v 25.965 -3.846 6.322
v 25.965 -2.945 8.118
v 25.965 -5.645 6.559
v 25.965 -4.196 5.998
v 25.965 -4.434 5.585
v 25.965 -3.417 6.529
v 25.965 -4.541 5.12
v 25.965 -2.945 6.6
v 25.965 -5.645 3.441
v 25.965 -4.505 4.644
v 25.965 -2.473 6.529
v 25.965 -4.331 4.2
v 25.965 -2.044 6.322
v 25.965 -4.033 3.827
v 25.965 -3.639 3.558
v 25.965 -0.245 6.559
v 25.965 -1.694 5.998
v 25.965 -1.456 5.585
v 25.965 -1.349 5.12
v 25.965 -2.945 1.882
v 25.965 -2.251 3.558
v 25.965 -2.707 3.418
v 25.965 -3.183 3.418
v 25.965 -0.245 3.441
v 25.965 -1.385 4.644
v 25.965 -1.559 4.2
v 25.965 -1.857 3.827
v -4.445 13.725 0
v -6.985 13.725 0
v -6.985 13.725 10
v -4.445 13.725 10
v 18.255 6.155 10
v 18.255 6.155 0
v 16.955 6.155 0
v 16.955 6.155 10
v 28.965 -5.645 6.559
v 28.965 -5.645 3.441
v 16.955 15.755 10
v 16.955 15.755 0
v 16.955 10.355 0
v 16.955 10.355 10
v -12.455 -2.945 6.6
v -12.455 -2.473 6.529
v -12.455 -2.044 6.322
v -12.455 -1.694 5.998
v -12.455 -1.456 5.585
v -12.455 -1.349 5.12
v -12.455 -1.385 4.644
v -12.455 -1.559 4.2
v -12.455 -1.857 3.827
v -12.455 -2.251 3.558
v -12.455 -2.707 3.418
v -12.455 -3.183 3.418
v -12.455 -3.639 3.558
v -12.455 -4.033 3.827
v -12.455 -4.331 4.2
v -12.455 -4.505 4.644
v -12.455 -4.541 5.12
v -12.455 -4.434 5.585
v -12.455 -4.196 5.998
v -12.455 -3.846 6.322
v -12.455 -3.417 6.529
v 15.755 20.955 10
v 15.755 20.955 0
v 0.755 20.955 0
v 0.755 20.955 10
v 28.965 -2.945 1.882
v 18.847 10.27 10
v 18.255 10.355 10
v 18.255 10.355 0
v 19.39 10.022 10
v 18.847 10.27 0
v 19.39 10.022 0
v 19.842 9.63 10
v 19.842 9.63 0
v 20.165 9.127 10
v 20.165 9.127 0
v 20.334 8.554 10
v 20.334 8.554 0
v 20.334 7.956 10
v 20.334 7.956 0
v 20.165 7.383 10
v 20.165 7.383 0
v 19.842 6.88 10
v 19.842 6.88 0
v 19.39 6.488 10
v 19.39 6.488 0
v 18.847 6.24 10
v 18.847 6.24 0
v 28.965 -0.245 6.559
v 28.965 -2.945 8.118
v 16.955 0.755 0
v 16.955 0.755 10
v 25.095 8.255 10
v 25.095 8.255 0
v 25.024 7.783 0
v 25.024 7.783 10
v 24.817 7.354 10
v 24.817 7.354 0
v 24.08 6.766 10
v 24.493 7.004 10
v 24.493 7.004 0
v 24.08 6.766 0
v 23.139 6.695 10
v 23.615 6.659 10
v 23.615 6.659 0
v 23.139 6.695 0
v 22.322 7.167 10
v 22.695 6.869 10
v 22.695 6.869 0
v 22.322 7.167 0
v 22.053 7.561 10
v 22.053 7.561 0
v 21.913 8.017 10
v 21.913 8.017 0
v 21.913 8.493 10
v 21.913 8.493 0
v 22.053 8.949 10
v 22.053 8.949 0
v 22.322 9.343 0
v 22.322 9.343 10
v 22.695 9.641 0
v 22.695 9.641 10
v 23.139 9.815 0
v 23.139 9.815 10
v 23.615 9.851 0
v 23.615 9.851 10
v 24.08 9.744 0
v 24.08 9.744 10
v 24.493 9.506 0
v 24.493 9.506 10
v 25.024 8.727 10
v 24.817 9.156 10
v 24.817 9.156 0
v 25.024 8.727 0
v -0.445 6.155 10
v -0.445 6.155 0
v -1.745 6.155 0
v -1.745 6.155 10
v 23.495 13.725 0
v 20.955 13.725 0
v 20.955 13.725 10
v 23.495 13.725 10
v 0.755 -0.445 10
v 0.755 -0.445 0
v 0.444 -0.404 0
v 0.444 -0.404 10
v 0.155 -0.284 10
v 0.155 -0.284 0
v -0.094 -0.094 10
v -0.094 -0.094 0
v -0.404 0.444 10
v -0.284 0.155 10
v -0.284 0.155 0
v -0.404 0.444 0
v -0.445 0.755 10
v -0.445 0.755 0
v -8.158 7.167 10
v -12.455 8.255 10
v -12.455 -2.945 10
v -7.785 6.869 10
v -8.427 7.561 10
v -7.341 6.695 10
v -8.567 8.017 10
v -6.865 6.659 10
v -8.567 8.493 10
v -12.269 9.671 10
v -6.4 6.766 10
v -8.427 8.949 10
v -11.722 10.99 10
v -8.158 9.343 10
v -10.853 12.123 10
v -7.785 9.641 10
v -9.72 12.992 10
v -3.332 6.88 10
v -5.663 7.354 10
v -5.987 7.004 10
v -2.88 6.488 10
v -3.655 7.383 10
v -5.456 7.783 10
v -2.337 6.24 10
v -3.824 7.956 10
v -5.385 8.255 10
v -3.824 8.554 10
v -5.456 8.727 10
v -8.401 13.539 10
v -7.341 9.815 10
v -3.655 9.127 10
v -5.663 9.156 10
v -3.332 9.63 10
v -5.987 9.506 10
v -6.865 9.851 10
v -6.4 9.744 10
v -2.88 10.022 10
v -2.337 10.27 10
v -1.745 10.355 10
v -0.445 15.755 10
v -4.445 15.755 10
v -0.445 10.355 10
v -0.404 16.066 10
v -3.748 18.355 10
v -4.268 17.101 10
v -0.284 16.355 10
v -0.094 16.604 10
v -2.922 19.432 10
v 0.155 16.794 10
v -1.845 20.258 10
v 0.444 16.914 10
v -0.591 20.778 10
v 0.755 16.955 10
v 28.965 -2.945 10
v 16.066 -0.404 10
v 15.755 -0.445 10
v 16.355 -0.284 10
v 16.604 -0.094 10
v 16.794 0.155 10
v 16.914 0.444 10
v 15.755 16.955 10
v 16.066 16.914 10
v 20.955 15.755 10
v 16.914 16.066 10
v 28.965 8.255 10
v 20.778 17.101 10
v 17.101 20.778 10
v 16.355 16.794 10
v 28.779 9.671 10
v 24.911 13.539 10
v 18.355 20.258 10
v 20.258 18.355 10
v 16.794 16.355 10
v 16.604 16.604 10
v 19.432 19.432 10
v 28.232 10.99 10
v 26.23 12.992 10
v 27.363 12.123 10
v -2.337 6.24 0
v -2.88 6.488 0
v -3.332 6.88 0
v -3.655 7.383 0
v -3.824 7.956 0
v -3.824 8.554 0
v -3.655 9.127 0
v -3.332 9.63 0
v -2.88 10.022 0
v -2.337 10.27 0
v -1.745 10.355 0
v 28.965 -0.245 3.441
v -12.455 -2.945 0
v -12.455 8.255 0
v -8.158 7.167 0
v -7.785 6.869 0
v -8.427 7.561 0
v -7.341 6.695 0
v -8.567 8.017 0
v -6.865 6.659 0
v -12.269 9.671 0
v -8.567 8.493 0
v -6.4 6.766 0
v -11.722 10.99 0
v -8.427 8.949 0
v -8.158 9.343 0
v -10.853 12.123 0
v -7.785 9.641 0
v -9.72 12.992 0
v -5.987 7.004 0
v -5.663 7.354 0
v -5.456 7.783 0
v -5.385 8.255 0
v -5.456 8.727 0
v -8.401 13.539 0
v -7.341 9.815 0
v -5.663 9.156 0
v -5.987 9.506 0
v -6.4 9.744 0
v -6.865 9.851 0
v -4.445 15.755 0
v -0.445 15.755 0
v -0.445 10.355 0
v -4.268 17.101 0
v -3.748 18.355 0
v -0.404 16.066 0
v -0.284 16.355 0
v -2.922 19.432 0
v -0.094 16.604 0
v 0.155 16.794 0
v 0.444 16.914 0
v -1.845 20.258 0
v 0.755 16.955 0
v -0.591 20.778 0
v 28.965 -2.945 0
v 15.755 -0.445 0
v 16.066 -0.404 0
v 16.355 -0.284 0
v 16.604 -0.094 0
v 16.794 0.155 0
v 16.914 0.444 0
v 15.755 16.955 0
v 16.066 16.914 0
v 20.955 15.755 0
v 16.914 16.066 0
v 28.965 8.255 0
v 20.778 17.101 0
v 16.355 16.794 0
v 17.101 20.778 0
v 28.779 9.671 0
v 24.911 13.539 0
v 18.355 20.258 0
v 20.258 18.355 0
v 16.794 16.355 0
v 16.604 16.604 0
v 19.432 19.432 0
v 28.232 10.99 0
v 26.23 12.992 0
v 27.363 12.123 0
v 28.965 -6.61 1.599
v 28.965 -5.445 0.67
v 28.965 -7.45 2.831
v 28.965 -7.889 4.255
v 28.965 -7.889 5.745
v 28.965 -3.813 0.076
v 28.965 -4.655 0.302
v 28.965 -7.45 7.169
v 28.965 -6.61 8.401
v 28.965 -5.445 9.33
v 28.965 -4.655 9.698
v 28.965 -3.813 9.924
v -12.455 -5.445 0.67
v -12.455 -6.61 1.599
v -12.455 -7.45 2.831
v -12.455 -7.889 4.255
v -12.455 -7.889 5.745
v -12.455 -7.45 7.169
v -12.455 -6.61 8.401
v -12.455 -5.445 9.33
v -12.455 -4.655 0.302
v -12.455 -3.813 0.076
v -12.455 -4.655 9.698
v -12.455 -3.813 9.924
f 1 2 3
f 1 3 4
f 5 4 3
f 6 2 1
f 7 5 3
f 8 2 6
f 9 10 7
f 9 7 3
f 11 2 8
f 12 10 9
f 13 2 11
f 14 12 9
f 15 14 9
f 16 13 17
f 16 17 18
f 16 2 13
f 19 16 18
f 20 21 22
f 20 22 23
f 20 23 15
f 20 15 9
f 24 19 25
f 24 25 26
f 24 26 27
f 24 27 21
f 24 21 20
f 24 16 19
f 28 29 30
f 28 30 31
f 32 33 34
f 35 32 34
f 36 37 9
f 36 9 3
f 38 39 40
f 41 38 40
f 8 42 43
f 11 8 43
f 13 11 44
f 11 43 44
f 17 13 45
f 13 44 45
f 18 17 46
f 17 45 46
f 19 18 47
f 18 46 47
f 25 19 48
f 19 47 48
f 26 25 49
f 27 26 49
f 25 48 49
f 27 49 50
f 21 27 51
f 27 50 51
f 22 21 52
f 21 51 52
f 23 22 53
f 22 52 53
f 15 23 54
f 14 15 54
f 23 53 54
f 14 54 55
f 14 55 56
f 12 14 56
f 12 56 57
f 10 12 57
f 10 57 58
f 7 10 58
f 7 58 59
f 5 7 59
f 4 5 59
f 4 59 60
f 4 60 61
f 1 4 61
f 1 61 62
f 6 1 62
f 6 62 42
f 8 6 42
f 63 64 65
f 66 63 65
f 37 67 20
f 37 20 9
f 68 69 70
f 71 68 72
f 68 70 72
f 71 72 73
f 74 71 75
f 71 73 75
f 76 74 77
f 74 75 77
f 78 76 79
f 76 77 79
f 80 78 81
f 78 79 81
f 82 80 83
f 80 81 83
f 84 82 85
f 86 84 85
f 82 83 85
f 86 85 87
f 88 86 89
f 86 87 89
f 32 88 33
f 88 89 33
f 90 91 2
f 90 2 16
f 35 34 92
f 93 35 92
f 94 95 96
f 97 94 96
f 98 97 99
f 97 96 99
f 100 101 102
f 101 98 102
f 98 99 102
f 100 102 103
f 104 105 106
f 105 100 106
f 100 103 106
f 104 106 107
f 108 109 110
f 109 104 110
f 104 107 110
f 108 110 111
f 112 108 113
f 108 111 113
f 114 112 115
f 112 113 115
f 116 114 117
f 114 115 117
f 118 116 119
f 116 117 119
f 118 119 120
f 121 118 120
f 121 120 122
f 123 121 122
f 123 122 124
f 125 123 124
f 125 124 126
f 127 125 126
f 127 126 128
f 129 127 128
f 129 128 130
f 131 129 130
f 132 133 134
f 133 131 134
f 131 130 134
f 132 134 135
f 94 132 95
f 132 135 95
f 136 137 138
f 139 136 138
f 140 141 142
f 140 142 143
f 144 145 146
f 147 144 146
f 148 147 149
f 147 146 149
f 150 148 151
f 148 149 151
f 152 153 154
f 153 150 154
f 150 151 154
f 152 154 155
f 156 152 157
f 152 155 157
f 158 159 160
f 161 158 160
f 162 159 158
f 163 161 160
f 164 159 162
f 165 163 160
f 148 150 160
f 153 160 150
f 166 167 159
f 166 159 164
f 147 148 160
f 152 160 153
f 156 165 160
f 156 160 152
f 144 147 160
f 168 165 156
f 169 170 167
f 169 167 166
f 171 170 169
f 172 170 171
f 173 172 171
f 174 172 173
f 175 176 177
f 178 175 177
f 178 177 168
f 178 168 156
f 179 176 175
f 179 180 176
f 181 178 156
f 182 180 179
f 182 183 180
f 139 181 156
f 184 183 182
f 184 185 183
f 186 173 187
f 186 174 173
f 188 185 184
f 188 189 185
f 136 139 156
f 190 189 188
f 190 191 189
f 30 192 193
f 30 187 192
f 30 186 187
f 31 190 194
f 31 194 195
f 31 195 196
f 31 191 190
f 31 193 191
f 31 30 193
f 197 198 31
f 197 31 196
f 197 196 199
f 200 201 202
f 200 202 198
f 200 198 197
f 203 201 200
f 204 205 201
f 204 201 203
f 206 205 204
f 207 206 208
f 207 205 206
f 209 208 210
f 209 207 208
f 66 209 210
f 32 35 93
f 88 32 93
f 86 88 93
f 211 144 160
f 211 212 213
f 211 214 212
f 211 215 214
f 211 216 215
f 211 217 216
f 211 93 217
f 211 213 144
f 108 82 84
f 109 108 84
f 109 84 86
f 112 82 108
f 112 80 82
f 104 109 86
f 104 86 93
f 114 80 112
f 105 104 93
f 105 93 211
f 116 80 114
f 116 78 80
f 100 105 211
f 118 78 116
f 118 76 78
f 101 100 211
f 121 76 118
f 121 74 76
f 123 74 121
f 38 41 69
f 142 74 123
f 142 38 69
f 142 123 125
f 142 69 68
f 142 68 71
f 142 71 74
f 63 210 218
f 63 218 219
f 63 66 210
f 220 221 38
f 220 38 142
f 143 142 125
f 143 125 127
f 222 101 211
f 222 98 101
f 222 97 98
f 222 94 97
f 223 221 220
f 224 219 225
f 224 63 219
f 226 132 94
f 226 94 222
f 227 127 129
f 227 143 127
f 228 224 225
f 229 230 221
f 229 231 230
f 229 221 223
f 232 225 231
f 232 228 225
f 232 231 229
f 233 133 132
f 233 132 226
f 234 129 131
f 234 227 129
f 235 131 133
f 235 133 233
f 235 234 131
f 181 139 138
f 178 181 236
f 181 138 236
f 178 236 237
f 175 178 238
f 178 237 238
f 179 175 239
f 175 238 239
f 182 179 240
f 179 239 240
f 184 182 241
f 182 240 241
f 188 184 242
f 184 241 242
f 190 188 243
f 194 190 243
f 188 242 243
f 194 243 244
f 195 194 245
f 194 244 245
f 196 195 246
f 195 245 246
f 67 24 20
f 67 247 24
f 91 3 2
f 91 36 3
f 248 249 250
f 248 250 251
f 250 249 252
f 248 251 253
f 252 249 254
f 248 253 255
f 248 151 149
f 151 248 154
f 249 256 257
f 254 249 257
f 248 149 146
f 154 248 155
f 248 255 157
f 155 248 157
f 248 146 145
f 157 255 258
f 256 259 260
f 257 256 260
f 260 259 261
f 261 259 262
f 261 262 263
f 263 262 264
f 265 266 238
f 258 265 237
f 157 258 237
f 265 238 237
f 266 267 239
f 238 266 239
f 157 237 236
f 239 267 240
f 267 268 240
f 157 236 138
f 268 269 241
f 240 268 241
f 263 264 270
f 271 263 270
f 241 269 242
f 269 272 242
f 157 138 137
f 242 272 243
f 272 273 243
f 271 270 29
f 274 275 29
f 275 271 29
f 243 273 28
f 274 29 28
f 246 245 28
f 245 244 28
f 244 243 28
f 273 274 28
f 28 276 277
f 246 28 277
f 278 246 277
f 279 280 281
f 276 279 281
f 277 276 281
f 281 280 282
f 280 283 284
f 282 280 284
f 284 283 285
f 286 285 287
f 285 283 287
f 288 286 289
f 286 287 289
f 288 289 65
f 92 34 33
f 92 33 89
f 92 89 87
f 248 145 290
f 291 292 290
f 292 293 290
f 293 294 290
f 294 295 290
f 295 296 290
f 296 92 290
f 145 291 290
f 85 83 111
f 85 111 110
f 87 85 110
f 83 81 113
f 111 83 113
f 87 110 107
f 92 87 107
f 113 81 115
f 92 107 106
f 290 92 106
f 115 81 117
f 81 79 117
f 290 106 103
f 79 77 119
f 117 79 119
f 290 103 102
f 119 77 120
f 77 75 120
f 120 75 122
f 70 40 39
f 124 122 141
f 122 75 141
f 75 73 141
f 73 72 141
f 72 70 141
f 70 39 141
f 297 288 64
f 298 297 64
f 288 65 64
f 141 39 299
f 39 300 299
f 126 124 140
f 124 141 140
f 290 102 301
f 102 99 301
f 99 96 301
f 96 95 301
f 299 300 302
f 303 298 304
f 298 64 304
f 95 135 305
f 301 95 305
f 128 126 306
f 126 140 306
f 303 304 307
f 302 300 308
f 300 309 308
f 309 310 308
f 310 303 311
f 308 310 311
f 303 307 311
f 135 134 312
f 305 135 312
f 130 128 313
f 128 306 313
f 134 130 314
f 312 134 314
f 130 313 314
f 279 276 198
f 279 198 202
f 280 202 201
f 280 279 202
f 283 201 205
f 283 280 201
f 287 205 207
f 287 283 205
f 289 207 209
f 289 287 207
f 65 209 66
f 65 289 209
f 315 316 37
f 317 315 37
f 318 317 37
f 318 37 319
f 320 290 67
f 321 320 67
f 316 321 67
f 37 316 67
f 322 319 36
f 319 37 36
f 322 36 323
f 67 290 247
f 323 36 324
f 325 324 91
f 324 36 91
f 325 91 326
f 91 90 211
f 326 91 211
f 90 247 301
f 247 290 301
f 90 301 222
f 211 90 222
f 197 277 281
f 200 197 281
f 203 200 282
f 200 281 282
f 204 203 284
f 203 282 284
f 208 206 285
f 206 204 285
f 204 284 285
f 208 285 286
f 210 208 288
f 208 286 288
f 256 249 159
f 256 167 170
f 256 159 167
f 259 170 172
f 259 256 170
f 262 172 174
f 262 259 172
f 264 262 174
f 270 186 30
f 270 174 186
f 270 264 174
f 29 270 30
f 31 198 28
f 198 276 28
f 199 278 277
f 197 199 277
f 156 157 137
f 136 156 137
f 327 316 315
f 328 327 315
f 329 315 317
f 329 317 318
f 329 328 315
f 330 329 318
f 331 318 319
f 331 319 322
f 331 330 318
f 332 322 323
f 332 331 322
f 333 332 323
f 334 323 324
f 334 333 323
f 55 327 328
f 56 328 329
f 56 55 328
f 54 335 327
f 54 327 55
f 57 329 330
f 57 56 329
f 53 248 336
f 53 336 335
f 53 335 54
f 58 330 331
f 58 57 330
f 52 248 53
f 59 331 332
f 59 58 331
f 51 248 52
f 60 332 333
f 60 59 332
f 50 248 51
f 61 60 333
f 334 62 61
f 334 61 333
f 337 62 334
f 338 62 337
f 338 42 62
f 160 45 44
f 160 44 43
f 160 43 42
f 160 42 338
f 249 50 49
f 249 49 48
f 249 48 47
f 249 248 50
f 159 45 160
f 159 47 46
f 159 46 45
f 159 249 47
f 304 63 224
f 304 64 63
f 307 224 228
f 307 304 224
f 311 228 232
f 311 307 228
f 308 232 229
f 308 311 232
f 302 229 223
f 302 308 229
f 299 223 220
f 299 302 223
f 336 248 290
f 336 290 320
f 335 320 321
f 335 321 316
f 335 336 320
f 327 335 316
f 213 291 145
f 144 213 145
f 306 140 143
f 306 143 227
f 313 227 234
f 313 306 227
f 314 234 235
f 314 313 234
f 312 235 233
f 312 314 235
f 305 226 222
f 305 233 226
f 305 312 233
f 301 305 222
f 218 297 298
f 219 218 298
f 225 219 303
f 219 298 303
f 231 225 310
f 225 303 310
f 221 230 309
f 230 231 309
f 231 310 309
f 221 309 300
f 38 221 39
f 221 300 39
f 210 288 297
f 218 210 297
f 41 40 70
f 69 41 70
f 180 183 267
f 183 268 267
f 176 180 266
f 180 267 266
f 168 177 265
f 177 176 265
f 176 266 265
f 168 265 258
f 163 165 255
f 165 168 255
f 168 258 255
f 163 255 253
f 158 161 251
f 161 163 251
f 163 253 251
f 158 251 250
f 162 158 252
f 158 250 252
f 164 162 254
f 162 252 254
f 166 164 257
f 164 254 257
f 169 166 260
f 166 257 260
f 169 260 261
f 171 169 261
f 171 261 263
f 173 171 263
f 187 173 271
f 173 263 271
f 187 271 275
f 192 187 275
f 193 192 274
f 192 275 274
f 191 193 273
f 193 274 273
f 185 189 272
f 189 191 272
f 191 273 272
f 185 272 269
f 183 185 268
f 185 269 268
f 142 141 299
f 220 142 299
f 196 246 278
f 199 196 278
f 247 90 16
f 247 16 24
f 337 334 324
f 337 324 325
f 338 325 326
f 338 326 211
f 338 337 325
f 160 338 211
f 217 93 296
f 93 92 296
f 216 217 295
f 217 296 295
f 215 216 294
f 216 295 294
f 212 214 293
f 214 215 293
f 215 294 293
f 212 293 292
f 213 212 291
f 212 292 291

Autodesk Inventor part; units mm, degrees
ref_plane "YZ Plane" through (0, 0, 0) normal (1, 0, 0) x (0, 1, 0)
ref_plane "XZ Plane" through (0, 0, 0) normal (0, 1, 0) x (-1, 0, 0)
ref_plane "XY Plane" through (0, 0, 0) normal (0, 0, 1) x (1, 0, 0)
sketch "Эскиз1" plane through (0, 0, 0) normal (0, 0, 1) x (1, 0, 0)
  line L0 (16.51, 16.51) -> (0, 16.51) projected
  line L1 (0, 16.51) -> (0, 11.176) projected
  line L2 (0, 11.176) -> (-6.731, 11.176) projected
  line L3 (-6.731, 11.176) -> (-7.4684, 11.0622) projected
  line L4 (-7.4684, 11.0622) -> (-8.1512, 10.7614) projected
  line L5 (-8.1512, 10.7614) -> (-8.733, 10.2942) projected
  line L6 (-8.733, 10.2942) -> (-9.1739, 9.6923) projected
  line L7 (-9.1739, 9.6923) -> (-9.4441, 8.9967) projected
  line L8 (-9.4441, 8.9967) -> (-9.525, 8.255) projected
  line L9 (-9.525, 8.255) -> (-9.4441, 7.5133) projected
  line L10 (-9.4441, 7.5133) -> (-9.1739, 6.8177) projected
  line L11 (-9.1739, 6.8177) -> (-8.733, 6.2158) projected
  line L12 (-8.733, 6.2158) -> (-8.1512, 5.7486) projected
  line L13 (-8.1512, 5.7486) -> (-7.4684, 5.4478) projected
  line L14 (-7.4684, 5.4478) -> (-6.731, 5.334) projected
  line L15 (-6.731, 5.334) -> (0, 5.334) projected
  line L16 (0, 5.334) -> (0, 0) projected
  line L17 (0, 0) -> (16.51, 0) projected
  line L18 (16.51, 0) -> (16.51, 5.334) projected
  line L19 (16.51, 5.334) -> (23.241, 5.334) projected
  line L20 (23.241, 5.334) -> (23.9784, 5.4478) projected
  line L21 (23.9784, 5.4478) -> (24.6612, 5.7486) projected
  line L22 (24.6612, 5.7486) -> (25.243, 6.2158) projected
  line L23 (25.243, 6.2158) -> (25.6839, 6.8177) projected
  line L24 (25.6839, 6.8177) -> (25.9541, 7.5133) projected
  line L25 (25.9541, 7.5133) -> (26.035, 8.255) projected
  line L26 (26.035, 8.255) -> (25.9541, 8.9967) projected
  line L27 (25.9541, 8.9967) -> (25.6839, 9.6923) projected
  line L28 (25.6839, 9.6923) -> (25.243, 10.2942) projected
  line L29 (25.243, 10.2942) -> (24.6612, 10.7614) projected
  line L30 (24.6612, 10.7614) -> (23.9784, 11.0622) projected
  line L31 (23.9784, 11.0622) -> (23.241, 11.176) projected
  line L32 (23.241, 11.176) -> (16.51, 11.176) projected
  line L33 (16.51, 11.176) -> (16.51, 16.51) projected
  circle A0 centre (18.26, 8.26) radius 1.27 projected
  circle A1 centre (-1.75, 8.26) radius 1.27 projected
  circle A2 centre (11.505, 9.45) radius 0.127 projected
  circle A3 centre (8.386, 9.267) radius 0.127 projected
  circle A4 centre (4.826, 15.748) radius 0.127 projected
  circle A5 centre (4.191, 15.748) radius 0.127 projected
  circle A6 centre (-6.985, 8.255) radius 1.5 projected
  circle A7 centre (23.495, 8.255) radius 1.5 projected
  circle A8 centre (3.048, 4.445) radius 0.1651 projected
  circle A9 centre (6.985, 4.445) radius 0.1651 projected
  circle A10 centre (2.286, 6.731) radius 0.2032 projected
  circle A11 centre (13.716, 8.509) radius 0.2032 projected
  circle A12 centre (12.319, 1.778) radius 0.2032 projected
  circle A13 centre (15.367, 16.002) radius 0.2032 projected
  circle A14 centre (14.732, 1.778) radius 0.2032 projected
  circle A15 centre (13.462, 1.778) radius 0.2032 projected
  circle A16 centre (11.5062, 15.748) radius 0.127 projected
  circle A17 centre (7.874, 15.748) radius 0.127 projected
  circle A18 centre (3.429, 14.859) radius 0.127 projected
  circle A19 centre (14.478, 15.113) radius 0.1651 projected
  circle A20 centre (2.286, 10.541) radius 0.2032 projected
  circle A21 centre (13.716, 11.176) radius 0.2032 projected
  circle A22 centre (5.505, 15.748) radius 0.127 projected
  circle A23 centre (14.478, 14.224) radius 0.1651 projected
  circle A24 centre (13.462, 15.113) radius 0.1651 projected
  circle A25 centre (10.414, 15.7988) radius 0.127 projected
  circle A26 centre (5.005, 9.727) radius 0.127 projected
  circle A27 centre (6.8072, 8.636) radius 0.127 projected
  circle A28 centre (4.699, 8.382) radius 0.127 projected
  circle A29 centre (10.922, 8.636) radius 0.127 projected
  circle A30 centre (6.378, 16.129) radius 0.127 projected
  circle A31 centre (10.4648, 5.4864) radius 0.127 projected
  circle A32 centre (11.2268, 5.4864) radius 0.127 projected
  circle A33 centre (10.4648, 6.1214) radius 0.127 projected
  circle A34 centre (9.1948, 7.8994) radius 0.127 projected
  circle A35 centre (2.955, 14.2) radius 0.3 projected
  circle A36 centre (9.779, 15.748) radius 0.127 projected
  circle A37 centre (9.906, 8.636) radius 0.127 projected
  circle A38 centre (9.194, 7.112) radius 0.127 projected
  circle A39 centre (9.144, 15.748) radius 0.127 projected
  circle A40 centre (5.588, 7.874) radius 0.127 projected
  circle A41 centre (13.335, 6.096) radius 0.1651 projected
  circle A42 centre (6.8072, 7.874) radius 0.127 projected
  circle A43 centre (6.878, 15.748) radius 0.127 projected
  circle A44 centre (7.378, 16.141) radius 0.127 projected
  circle A45 centre (5.588, 7.239) radius 0.127 projected
  circle A46 centre (8.509, 15.748) radius 0.127 projected
  circle A47 centre (7.5946, 7.1186) radius 0.127 projected
  circle A48 centre (13.555, 14.2) radius 0.3 projected
  line L34 (9.655, 16.755) -> (9.655, 15.8775) projected
  arc A49 (6.855, 15.8775) -> (9.655, 15.8775) centre (8.255, 8.255) ccw projected
  line L35 (6.855, 15.8775) -> (6.855, 16.755) projected
  line L36 (6.855, 16.755) -> (0.755, 16.755) projected
  arc A50 (0.755, 16.755) -> (-0.245, 15.755) centre (0.755, 15.755) ccw projected
  line L37 (-0.245, 15.755) -> (-0.245, 10.155) projected
  line L38 (-0.245, 10.155) -> (-1.745, 10.155) projected
  arc A51 (-1.745, 10.155) -> (-1.745, 6.355) centre (-1.745, 8.255) ccw projected
  line L39 (-1.745, 6.355) -> (-0.245, 6.355) projected
  line L40 (-0.245, 6.355) -> (-0.245, 0.755) projected
  arc A52 (-0.245, 0.755) -> (0.755, -0.245) centre (0.755, 0.755) ccw projected
  line L41 (0.755, -0.245) -> (15.755, -0.245) projected
  arc A53 (15.755, -0.245) -> (16.755, 0.755) centre (15.755, 0.755) ccw projected
  line L42 (16.755, 0.755) -> (16.755, 6.355) projected
  line L43 (16.755, 6.355) -> (18.255, 6.355) projected
  arc A54 (18.255, 6.355) -> (18.255, 10.155) centre (18.255, 8.255) ccw projected
  line L44 (18.255, 10.155) -> (16.755, 10.155) projected
  line L45 (16.755, 10.155) -> (16.755, 15.755) projected
  arc A55 (16.755, 15.755) -> (15.755, 16.755) centre (15.755, 15.755) ccw projected
  line L46 (15.755, 16.755) -> (9.655, 16.755) projected
  circle A56 centre (-1.745, 8.255) radius 0.9 projected
  circle A57 centre (18.255, 8.255) radius 0.9 projected
  line L47 (-1.745, 10.355) -> (-0.445, 10.355)
  line L48 (-0.445, 10.355) -> (-0.445, 15.755)
  arc A58 (0.755, 16.955) -> (-0.445, 15.755) centre (0.755, 15.755) ccw
  line L49 (0.755, 16.955) -> (7.055, 16.955)
  line L50 (7.055, 16.955) -> (7.055, 15.709)
  arc A59 (7.055, 15.709) -> (9.455, 15.709) centre (8.255, 8.255) ccw
  line L51 (9.455, 15.709) -> (9.455, 16.955)
  line L52 (9.455, 16.955) -> (15.755, 16.955)
  arc A60 (16.955, 15.755) -> (15.755, 16.955) centre (15.755, 15.755) ccw
  line L53 (16.955, 15.755) -> (16.955, 10.355)
  line L54 (16.955, 10.355) -> (18.255, 10.355)
  arc A61 (18.255, 6.155) -> (18.255, 10.355) centre (18.255, 8.255) ccw
  line L55 (18.255, 6.155) -> (16.955, 6.155)
  line L56 (16.955, 6.155) -> (16.955, 0.755)
  arc A62 (15.755, -0.445) -> (16.955, 0.755) centre (15.755, 0.755) ccw
  line L57 (15.755, -0.445) -> (0.755, -0.445)
  arc A63 (-0.445, 0.755) -> (0.755, -0.445) centre (0.755, 0.755) ccw
  line L58 (-0.445, 0.755) -> (-0.445, 6.155)
  line L59 (-0.445, 6.155) -> (-1.745, 6.155)
  arc A64 (-1.745, 10.355) -> (-1.745, 6.155) centre (-1.745, 8.255) ccw
  line L60 (7.055, 16.955) -> (9.455, 16.955)
  line L61 (7.055, 20.955) -> (0.755, 20.955)
  arc A65 (0.755, 20.955) -> (-4.445, 15.755) centre (0.755, 15.755) ccw
  line L62 (-4.445, 15.755) -> (-4.445, 13.7249)
  line L63 (-4.445, 2.7851) -> (-4.445, 0.755)
  line L64 (20.955, 0.755) -> (20.955, 2.7851)
  line L65 (20.955, 13.7249) -> (20.955, 15.755)
  arc A66 (20.955, 15.755) -> (15.755, 20.955) centre (15.755, 15.755) ccw
  line L66 (15.755, 20.955) -> (9.455, 20.955)
  line L67 (7.055, 20.955) -> (9.455, 20.955)
  circle A67 centre (23.495, 8.255) radius 5.4699
  circle A68 centre (-6.985, 8.255) radius 5.4699
  line L68 (-6.985, 13.7249) -> (-4.445, 13.7249)
  line L69 (-4.445, 2.7851) -> (-6.985, 2.7851)
  line L70 (20.955, 2.7851) -> (23.495, 2.7851)
  line L71 (20.955, 13.7249) -> (23.495, 13.7249)
  circle A69 centre (-6.985, 8.255) radius 1.6
  circle A70 centre (23.495, 8.255) radius 1.6
  line L72 (-4.445, 0.755) -> (20.955, 0.755)
  line L73 (20.955, -5.445) -> (-4.445, -5.445)
  line L74 (28.9649, 8.255) -> (28.9649, -5.445)
  line L75 (28.9649, -5.445) -> (-12.4549, -5.445)
  line L76 (-12.4549, -5.445) -> (-12.4549, 8.255)
  point P0 (-0.445, 0.755)
  point P1 (-4.445, -5.445)
  dimension "d0" = 0.2
  dimension "d1" = 4
  dimension "d2" = 3.2
  dimension "d3" = 3.2
extrude "Выдавливание1" add sketch "Эскиз1" along normal blind 10 contours L60 L49 A58 L48 L2 A68 L68 L62 A65 L61 L67 L66 A66 L65 L71 A67 L32 L53 A60 L52 | L32 A67 A61 L54 L53 | A67 L19 L20 L21 L22 L23 L24 L25 L26 L27 L28 L29 L30 L31 L32 | L32 L31 L30 L29 L28 L27 L26 L25 L24 L23 L22 L21 L20 L19 A67 A61 | L74 L75 L73 L76 A68 L69 L63 L72 A63 L57 A62 L64 L70 A67 | A67 L19 L56 L55 A61 | L48 L47 A64 A68 L2 | L70 L64 L72 L56 L19 A67 | A68 A64 L15 L14 L13 L12 L11 L10 L9 L8 L7 L6 L5 L4 L3 L2 | L2 L3 L4 L5 L6 L7 L8 L9 L10 L11 L12 L13 L14 L15 A68 | A64 L59 L58 L15 A68 | L72 L63 L69 A68 L15 L58
sketch "Эскиз3" plane through (-12.4549, -5.445, 0) normal (-1, 0, 0) x (0, 0, 1)
  line L0 (0, 0) -> (0, 13.7) projected
  line L1 (0, 5) -> (10, 5) projected
  line L2 (0, 0) -> (10, 0)
  line L3 (10, 0) -> (10, 5)
  line L4 (10, 5) -> (0, 5)
  line L5 (0, 5) -> (0, 0)
  line L6 (5, 5) -> (5, 0)
  line L7 (0, 0) -> (10, 0) projected
  circle A0 centre (5, 2.5) radius 1.6
  circle A1 centre (5, 2.5) radius 5
  line L8 (10, 0) -> (10, 13.7) projected
  point P0 (0, 5.445)
  point P1 (0.6699, 0)
  point P2 (0, 2.5)
  point P3 (10, 2.5)
  point P4 (9.3301, 0)
  dimension "d11" = 3.2
extrude "Выдавливание3" cut sketch "Эскиз3" against normal up to surface (41.4198 mm away) contours L0 A1 L2 | A1 L3 L2 | A0 L6 | L6 A0
sketch "Эскиз4" plane through (-12.4549, -5.445, 0) normal (-1, 0, 0) x (0, 0, 1)
  circle A0 centre (5, 2.5) radius 1.6 projected
  circle A1 centre (5, 2.5) radius 5
  line L0 (10, 0) -> (10, 13.7) projected
  arc A2 (0, 2.5) -> (0.6699, 0) centre (5, 2.5) ccw projected
  line L1 (0.6699, 0) -> (9.3301, 0) projected
  line L2 (0.6699, 0) -> (9.3301, 0)
  point P0 (0, 5.445)
extrude "Выдавливание4" add sketch "Эскиз4" against normal up to surface (41.4198 mm away) contours A1 L1 picked at (4.43, -1.3536)
sketch "Эскиз5" plane through (28.9649, 8.255, 10) normal (1, 0, 0) x (0, 0, -1)
  line L0 (5, -11.2) -> (5, -8.5)
  line L1 (6.5588, -8.5) -> (8.1177, -11.2)
  line L2 (8.1177, -11.2) -> (6.5588, -13.9)
  line L3 (6.5588, -13.9) -> (3.4412, -13.9)
  line L4 (3.4412, -13.9) -> (1.8823, -11.2)
  line L5 (1.8823, -11.2) -> (3.4412, -8.5)
  line L6 (3.4412, -8.5) -> (6.5588, -8.5)
  dimension "d17" = 2.7
extrude "Выдавливание5" cut sketch "Эскиз5" against normal blind 3
properties part number "ramka"
